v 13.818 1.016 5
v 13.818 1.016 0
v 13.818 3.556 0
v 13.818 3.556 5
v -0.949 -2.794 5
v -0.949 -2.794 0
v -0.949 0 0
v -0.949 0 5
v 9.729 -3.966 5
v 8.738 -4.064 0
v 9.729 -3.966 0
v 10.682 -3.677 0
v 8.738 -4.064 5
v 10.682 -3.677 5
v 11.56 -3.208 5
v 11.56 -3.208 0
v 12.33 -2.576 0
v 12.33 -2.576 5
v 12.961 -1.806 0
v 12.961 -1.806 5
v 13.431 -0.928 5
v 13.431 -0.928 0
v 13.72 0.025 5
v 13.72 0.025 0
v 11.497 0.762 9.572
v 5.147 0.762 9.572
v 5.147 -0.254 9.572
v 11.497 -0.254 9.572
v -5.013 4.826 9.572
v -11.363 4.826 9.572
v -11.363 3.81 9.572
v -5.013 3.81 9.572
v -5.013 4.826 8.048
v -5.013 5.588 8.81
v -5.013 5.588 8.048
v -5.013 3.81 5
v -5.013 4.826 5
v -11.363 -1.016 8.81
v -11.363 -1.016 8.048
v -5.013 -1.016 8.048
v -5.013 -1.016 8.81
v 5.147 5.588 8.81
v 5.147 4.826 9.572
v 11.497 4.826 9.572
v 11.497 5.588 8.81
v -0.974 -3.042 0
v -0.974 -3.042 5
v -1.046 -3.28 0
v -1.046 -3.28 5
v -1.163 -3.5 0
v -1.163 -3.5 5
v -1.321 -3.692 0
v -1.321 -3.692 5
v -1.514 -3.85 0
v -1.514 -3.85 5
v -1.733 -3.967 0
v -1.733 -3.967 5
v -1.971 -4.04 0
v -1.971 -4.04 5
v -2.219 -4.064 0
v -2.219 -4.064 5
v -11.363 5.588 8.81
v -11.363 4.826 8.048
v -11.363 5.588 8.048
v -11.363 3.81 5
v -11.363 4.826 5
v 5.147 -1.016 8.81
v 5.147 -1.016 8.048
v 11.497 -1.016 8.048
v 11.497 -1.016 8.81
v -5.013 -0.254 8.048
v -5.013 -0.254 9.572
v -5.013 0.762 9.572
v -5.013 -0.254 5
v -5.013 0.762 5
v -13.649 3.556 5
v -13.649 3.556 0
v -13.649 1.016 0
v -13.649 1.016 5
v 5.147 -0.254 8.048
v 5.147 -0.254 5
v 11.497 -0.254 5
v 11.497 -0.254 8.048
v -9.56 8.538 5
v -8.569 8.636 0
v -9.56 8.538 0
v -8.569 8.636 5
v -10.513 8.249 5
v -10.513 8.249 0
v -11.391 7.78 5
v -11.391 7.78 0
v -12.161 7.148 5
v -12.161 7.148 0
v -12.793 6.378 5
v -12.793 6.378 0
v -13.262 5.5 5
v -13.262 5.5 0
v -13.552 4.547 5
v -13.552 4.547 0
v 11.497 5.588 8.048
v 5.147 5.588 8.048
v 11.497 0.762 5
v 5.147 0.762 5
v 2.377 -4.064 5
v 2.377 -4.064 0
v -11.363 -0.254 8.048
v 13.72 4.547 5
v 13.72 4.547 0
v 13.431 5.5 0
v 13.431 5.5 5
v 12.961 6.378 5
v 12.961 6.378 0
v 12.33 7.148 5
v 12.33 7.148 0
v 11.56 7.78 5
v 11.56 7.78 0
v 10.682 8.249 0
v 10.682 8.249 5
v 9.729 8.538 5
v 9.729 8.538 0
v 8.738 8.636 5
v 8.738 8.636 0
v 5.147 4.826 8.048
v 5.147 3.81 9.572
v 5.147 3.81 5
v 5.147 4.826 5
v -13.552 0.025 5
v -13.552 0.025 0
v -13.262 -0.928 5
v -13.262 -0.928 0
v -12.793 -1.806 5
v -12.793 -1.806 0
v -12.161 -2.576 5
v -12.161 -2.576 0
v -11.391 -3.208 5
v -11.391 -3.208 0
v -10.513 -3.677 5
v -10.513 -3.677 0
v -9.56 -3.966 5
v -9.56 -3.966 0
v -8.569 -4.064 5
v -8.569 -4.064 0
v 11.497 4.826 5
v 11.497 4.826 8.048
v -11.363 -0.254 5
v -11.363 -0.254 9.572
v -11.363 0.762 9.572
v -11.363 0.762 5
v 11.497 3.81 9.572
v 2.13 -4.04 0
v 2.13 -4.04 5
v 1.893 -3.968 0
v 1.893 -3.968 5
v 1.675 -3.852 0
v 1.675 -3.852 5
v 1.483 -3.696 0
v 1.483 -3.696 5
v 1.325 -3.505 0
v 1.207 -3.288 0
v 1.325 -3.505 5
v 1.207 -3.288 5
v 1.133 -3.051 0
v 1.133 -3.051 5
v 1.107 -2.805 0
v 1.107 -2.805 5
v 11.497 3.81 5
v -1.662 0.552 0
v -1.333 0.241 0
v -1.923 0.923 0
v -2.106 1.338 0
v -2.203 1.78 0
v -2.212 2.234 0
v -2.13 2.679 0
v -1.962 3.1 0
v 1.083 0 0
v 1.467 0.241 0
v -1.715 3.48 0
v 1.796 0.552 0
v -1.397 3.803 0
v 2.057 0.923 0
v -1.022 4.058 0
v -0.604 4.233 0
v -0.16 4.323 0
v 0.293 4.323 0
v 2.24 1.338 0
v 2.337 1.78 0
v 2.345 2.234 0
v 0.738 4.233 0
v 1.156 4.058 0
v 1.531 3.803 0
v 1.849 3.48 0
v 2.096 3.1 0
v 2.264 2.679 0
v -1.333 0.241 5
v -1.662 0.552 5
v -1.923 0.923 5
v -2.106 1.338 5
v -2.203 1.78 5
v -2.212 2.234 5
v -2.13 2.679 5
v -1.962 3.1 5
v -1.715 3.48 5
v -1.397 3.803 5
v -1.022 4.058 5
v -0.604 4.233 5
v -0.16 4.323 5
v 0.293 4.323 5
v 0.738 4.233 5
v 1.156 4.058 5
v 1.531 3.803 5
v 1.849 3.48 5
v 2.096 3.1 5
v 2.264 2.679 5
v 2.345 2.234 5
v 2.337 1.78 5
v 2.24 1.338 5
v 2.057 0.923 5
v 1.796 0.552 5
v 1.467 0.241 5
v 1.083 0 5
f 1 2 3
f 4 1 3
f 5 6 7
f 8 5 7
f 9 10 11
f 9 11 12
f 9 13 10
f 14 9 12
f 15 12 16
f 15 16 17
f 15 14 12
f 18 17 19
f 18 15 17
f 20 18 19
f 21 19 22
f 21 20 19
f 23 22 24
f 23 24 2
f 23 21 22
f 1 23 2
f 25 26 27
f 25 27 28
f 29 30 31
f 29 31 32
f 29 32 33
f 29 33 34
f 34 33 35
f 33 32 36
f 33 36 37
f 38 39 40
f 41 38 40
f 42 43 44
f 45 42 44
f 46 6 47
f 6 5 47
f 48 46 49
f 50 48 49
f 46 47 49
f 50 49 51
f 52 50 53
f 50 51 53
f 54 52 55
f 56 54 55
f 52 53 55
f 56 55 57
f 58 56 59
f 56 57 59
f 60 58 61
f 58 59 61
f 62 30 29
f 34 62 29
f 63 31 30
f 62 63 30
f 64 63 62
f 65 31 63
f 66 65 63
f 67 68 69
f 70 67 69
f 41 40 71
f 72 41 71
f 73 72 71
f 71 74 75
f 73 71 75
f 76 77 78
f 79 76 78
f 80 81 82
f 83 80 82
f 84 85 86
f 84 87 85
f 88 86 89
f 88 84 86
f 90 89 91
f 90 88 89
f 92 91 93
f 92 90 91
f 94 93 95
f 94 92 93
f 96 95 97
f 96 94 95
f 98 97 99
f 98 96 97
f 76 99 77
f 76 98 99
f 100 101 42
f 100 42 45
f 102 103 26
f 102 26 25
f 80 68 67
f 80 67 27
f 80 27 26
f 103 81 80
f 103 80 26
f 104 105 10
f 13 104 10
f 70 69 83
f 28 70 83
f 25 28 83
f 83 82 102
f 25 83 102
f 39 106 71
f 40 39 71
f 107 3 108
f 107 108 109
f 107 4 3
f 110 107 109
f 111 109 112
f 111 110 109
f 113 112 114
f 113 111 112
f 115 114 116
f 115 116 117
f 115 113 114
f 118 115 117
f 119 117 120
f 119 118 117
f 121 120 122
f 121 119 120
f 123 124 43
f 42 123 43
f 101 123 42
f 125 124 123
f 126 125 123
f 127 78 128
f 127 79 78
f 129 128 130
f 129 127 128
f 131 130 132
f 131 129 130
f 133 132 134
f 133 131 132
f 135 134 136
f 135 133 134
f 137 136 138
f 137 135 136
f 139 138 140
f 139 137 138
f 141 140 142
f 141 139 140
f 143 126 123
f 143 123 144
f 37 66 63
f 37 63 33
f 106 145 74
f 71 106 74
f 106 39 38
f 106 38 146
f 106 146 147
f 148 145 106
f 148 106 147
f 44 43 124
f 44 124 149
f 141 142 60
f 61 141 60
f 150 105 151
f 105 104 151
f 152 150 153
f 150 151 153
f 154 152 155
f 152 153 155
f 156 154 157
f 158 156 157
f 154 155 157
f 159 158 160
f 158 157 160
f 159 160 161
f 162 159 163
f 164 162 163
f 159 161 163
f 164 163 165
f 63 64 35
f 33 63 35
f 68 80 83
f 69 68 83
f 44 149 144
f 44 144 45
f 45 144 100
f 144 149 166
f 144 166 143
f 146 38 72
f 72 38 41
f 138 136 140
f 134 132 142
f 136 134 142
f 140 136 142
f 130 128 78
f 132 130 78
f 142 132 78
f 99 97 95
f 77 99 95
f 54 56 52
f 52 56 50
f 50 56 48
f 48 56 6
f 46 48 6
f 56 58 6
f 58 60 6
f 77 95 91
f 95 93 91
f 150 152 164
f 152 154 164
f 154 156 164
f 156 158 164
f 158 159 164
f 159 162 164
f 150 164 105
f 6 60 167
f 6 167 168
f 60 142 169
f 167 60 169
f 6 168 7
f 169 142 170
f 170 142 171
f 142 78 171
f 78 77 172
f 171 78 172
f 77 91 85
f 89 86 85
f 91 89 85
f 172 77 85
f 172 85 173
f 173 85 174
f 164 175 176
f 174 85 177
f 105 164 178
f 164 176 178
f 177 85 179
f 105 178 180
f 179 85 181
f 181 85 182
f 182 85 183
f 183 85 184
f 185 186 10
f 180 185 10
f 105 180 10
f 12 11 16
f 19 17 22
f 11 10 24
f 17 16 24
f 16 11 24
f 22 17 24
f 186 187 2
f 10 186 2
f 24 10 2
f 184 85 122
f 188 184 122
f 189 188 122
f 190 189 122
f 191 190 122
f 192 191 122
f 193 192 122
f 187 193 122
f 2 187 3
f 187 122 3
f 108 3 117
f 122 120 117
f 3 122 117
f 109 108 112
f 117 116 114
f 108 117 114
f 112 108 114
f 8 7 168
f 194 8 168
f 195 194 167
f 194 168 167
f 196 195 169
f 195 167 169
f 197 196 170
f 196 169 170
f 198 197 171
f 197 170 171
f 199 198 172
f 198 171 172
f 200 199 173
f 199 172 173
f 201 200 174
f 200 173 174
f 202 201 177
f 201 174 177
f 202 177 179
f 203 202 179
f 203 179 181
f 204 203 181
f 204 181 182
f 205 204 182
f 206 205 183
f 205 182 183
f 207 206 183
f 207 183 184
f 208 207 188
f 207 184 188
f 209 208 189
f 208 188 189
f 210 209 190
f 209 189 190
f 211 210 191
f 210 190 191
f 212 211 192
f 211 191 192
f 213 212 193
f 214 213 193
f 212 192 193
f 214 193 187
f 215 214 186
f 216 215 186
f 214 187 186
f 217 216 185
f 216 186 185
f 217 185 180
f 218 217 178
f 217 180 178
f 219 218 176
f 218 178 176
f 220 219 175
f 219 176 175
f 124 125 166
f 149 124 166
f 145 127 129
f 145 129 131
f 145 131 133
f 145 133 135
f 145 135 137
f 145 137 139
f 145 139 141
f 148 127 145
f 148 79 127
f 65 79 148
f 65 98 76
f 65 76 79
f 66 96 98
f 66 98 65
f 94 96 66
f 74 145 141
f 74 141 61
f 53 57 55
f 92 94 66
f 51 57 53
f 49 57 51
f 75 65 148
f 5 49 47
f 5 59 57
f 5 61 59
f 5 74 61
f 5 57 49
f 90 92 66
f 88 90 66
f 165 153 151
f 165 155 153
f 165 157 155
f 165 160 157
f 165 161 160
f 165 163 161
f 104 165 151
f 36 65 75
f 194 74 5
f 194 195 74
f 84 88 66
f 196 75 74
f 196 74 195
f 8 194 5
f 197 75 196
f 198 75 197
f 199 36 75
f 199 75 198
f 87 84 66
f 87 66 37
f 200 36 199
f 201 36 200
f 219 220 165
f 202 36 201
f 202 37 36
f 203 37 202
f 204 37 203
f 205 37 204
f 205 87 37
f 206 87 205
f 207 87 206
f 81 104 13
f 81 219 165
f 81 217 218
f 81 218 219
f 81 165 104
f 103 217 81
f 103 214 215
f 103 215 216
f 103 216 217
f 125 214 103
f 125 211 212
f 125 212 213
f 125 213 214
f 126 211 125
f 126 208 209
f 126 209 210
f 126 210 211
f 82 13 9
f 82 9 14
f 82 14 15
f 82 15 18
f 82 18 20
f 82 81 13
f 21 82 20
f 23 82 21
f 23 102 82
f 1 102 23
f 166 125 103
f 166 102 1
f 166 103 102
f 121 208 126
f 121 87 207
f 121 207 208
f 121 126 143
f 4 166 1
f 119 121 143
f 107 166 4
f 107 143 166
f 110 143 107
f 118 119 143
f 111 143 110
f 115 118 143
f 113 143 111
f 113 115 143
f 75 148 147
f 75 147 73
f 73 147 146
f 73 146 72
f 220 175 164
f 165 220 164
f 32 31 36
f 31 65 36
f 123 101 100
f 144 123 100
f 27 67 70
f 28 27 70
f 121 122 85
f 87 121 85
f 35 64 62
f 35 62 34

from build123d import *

# Parameters (mm, degrees)
F1_DEPTH = 5
F2_R     = 5.08
F3_R     = 1.27
F4_W     = 6.35
F4_H     = 1.016
F5_DEPTH = 3.048
F6_W     = 6.35
F6_H     = 1.778
F7_DEPTH = 1.524
F8_SIZE  = 0.762


with BuildPart() as f1:
    # F0 (on Top) → F1 (new body)
    with BuildSketch(Plane.XY):
        with BuildLine():
            ThreePointArc((-0.949158, 0), (0.066842, 4.333813), (1.082842, 0))
            Line((1.082842, 0), (1.117634, -4.064))
            Line((1.117634, -4.064), (13.817634, -4.064))
            Line((13.817634, -4.064), (13.817634, 8.636))
            Line((13.817634, 8.636), (-13.649158, 8.636))
            Line((-13.649158, 8.636), (-13.649158, -4.064))
            Line((-13.649158, -4.064), (-0.949158, -4.064))
            Line((-0.949158, -4.064), (-0.949158, 0))
        make_face()
    extrude(amount=F1_DEPTH)

    # F2
    f2_edges = [f1.edges().sort_by_distance(p)[0] for p in [
        (-13.649158, 8.636, 2.5),
        (13.817634, 8.636, 2.5),
        (13.817634, -4.064, 2.5),
        (-13.649158, -4.064, 2.5),
    ]]
    fillet(f2_edges, radius=F2_R)

    # F3
    f3_edges = [f1.edges().sort_by_distance(p)[0] for p in [
        (1.117634, -4.064, 2.5),
        (-0.949158, -4.064, 2.5),
    ]]
    fillet(f3_edges, radius=F3_R)

    # F4 (on face) → F5 (join)
    with BuildSketch(Plane.XY.offset(5)):
        with Locations((-8.188158, 0.254)):
            Rectangle(F4_W, F4_H)
        with Locations((-8.188158, 4.318)):
            Rectangle(F4_W, F4_H)
        with Locations((8.321842, 4.318)):
            Rectangle(F4_W, F4_H)
        with Locations((8.321842, 0.254)):
            Rectangle(F4_W, F4_H)
    extrude(amount=F5_DEPTH)

    # F6 (on face) → F7 (join)
    with BuildSketch(Plane.XY.offset(8.048)):
        with Locations((-8.188158, 4.699)):
            Rectangle(F6_W, F6_H)
        with Locations((-8.188158, -0.127)):
            Rectangle(F6_W, F6_H)
        with Locations((8.321842, 4.699)):
            Rectangle(F6_W, F6_H)
        with Locations((8.321842, -0.127)):
            Rectangle(F6_W, F6_H)
    extrude(amount=F7_DEPTH)

    # F8
    f8_edges = [f1.edges().sort_by_distance(p)[0] for p in [
        (-8.188158, -1.016, 9.572),
        (-8.188158, 5.588, 9.572),
        (8.321842, 5.588, 9.572),
        (8.321842, -1.016, 9.572),
    ]]
    chamfer(f8_edges, length=F8_SIZE)


solid = f1.part
